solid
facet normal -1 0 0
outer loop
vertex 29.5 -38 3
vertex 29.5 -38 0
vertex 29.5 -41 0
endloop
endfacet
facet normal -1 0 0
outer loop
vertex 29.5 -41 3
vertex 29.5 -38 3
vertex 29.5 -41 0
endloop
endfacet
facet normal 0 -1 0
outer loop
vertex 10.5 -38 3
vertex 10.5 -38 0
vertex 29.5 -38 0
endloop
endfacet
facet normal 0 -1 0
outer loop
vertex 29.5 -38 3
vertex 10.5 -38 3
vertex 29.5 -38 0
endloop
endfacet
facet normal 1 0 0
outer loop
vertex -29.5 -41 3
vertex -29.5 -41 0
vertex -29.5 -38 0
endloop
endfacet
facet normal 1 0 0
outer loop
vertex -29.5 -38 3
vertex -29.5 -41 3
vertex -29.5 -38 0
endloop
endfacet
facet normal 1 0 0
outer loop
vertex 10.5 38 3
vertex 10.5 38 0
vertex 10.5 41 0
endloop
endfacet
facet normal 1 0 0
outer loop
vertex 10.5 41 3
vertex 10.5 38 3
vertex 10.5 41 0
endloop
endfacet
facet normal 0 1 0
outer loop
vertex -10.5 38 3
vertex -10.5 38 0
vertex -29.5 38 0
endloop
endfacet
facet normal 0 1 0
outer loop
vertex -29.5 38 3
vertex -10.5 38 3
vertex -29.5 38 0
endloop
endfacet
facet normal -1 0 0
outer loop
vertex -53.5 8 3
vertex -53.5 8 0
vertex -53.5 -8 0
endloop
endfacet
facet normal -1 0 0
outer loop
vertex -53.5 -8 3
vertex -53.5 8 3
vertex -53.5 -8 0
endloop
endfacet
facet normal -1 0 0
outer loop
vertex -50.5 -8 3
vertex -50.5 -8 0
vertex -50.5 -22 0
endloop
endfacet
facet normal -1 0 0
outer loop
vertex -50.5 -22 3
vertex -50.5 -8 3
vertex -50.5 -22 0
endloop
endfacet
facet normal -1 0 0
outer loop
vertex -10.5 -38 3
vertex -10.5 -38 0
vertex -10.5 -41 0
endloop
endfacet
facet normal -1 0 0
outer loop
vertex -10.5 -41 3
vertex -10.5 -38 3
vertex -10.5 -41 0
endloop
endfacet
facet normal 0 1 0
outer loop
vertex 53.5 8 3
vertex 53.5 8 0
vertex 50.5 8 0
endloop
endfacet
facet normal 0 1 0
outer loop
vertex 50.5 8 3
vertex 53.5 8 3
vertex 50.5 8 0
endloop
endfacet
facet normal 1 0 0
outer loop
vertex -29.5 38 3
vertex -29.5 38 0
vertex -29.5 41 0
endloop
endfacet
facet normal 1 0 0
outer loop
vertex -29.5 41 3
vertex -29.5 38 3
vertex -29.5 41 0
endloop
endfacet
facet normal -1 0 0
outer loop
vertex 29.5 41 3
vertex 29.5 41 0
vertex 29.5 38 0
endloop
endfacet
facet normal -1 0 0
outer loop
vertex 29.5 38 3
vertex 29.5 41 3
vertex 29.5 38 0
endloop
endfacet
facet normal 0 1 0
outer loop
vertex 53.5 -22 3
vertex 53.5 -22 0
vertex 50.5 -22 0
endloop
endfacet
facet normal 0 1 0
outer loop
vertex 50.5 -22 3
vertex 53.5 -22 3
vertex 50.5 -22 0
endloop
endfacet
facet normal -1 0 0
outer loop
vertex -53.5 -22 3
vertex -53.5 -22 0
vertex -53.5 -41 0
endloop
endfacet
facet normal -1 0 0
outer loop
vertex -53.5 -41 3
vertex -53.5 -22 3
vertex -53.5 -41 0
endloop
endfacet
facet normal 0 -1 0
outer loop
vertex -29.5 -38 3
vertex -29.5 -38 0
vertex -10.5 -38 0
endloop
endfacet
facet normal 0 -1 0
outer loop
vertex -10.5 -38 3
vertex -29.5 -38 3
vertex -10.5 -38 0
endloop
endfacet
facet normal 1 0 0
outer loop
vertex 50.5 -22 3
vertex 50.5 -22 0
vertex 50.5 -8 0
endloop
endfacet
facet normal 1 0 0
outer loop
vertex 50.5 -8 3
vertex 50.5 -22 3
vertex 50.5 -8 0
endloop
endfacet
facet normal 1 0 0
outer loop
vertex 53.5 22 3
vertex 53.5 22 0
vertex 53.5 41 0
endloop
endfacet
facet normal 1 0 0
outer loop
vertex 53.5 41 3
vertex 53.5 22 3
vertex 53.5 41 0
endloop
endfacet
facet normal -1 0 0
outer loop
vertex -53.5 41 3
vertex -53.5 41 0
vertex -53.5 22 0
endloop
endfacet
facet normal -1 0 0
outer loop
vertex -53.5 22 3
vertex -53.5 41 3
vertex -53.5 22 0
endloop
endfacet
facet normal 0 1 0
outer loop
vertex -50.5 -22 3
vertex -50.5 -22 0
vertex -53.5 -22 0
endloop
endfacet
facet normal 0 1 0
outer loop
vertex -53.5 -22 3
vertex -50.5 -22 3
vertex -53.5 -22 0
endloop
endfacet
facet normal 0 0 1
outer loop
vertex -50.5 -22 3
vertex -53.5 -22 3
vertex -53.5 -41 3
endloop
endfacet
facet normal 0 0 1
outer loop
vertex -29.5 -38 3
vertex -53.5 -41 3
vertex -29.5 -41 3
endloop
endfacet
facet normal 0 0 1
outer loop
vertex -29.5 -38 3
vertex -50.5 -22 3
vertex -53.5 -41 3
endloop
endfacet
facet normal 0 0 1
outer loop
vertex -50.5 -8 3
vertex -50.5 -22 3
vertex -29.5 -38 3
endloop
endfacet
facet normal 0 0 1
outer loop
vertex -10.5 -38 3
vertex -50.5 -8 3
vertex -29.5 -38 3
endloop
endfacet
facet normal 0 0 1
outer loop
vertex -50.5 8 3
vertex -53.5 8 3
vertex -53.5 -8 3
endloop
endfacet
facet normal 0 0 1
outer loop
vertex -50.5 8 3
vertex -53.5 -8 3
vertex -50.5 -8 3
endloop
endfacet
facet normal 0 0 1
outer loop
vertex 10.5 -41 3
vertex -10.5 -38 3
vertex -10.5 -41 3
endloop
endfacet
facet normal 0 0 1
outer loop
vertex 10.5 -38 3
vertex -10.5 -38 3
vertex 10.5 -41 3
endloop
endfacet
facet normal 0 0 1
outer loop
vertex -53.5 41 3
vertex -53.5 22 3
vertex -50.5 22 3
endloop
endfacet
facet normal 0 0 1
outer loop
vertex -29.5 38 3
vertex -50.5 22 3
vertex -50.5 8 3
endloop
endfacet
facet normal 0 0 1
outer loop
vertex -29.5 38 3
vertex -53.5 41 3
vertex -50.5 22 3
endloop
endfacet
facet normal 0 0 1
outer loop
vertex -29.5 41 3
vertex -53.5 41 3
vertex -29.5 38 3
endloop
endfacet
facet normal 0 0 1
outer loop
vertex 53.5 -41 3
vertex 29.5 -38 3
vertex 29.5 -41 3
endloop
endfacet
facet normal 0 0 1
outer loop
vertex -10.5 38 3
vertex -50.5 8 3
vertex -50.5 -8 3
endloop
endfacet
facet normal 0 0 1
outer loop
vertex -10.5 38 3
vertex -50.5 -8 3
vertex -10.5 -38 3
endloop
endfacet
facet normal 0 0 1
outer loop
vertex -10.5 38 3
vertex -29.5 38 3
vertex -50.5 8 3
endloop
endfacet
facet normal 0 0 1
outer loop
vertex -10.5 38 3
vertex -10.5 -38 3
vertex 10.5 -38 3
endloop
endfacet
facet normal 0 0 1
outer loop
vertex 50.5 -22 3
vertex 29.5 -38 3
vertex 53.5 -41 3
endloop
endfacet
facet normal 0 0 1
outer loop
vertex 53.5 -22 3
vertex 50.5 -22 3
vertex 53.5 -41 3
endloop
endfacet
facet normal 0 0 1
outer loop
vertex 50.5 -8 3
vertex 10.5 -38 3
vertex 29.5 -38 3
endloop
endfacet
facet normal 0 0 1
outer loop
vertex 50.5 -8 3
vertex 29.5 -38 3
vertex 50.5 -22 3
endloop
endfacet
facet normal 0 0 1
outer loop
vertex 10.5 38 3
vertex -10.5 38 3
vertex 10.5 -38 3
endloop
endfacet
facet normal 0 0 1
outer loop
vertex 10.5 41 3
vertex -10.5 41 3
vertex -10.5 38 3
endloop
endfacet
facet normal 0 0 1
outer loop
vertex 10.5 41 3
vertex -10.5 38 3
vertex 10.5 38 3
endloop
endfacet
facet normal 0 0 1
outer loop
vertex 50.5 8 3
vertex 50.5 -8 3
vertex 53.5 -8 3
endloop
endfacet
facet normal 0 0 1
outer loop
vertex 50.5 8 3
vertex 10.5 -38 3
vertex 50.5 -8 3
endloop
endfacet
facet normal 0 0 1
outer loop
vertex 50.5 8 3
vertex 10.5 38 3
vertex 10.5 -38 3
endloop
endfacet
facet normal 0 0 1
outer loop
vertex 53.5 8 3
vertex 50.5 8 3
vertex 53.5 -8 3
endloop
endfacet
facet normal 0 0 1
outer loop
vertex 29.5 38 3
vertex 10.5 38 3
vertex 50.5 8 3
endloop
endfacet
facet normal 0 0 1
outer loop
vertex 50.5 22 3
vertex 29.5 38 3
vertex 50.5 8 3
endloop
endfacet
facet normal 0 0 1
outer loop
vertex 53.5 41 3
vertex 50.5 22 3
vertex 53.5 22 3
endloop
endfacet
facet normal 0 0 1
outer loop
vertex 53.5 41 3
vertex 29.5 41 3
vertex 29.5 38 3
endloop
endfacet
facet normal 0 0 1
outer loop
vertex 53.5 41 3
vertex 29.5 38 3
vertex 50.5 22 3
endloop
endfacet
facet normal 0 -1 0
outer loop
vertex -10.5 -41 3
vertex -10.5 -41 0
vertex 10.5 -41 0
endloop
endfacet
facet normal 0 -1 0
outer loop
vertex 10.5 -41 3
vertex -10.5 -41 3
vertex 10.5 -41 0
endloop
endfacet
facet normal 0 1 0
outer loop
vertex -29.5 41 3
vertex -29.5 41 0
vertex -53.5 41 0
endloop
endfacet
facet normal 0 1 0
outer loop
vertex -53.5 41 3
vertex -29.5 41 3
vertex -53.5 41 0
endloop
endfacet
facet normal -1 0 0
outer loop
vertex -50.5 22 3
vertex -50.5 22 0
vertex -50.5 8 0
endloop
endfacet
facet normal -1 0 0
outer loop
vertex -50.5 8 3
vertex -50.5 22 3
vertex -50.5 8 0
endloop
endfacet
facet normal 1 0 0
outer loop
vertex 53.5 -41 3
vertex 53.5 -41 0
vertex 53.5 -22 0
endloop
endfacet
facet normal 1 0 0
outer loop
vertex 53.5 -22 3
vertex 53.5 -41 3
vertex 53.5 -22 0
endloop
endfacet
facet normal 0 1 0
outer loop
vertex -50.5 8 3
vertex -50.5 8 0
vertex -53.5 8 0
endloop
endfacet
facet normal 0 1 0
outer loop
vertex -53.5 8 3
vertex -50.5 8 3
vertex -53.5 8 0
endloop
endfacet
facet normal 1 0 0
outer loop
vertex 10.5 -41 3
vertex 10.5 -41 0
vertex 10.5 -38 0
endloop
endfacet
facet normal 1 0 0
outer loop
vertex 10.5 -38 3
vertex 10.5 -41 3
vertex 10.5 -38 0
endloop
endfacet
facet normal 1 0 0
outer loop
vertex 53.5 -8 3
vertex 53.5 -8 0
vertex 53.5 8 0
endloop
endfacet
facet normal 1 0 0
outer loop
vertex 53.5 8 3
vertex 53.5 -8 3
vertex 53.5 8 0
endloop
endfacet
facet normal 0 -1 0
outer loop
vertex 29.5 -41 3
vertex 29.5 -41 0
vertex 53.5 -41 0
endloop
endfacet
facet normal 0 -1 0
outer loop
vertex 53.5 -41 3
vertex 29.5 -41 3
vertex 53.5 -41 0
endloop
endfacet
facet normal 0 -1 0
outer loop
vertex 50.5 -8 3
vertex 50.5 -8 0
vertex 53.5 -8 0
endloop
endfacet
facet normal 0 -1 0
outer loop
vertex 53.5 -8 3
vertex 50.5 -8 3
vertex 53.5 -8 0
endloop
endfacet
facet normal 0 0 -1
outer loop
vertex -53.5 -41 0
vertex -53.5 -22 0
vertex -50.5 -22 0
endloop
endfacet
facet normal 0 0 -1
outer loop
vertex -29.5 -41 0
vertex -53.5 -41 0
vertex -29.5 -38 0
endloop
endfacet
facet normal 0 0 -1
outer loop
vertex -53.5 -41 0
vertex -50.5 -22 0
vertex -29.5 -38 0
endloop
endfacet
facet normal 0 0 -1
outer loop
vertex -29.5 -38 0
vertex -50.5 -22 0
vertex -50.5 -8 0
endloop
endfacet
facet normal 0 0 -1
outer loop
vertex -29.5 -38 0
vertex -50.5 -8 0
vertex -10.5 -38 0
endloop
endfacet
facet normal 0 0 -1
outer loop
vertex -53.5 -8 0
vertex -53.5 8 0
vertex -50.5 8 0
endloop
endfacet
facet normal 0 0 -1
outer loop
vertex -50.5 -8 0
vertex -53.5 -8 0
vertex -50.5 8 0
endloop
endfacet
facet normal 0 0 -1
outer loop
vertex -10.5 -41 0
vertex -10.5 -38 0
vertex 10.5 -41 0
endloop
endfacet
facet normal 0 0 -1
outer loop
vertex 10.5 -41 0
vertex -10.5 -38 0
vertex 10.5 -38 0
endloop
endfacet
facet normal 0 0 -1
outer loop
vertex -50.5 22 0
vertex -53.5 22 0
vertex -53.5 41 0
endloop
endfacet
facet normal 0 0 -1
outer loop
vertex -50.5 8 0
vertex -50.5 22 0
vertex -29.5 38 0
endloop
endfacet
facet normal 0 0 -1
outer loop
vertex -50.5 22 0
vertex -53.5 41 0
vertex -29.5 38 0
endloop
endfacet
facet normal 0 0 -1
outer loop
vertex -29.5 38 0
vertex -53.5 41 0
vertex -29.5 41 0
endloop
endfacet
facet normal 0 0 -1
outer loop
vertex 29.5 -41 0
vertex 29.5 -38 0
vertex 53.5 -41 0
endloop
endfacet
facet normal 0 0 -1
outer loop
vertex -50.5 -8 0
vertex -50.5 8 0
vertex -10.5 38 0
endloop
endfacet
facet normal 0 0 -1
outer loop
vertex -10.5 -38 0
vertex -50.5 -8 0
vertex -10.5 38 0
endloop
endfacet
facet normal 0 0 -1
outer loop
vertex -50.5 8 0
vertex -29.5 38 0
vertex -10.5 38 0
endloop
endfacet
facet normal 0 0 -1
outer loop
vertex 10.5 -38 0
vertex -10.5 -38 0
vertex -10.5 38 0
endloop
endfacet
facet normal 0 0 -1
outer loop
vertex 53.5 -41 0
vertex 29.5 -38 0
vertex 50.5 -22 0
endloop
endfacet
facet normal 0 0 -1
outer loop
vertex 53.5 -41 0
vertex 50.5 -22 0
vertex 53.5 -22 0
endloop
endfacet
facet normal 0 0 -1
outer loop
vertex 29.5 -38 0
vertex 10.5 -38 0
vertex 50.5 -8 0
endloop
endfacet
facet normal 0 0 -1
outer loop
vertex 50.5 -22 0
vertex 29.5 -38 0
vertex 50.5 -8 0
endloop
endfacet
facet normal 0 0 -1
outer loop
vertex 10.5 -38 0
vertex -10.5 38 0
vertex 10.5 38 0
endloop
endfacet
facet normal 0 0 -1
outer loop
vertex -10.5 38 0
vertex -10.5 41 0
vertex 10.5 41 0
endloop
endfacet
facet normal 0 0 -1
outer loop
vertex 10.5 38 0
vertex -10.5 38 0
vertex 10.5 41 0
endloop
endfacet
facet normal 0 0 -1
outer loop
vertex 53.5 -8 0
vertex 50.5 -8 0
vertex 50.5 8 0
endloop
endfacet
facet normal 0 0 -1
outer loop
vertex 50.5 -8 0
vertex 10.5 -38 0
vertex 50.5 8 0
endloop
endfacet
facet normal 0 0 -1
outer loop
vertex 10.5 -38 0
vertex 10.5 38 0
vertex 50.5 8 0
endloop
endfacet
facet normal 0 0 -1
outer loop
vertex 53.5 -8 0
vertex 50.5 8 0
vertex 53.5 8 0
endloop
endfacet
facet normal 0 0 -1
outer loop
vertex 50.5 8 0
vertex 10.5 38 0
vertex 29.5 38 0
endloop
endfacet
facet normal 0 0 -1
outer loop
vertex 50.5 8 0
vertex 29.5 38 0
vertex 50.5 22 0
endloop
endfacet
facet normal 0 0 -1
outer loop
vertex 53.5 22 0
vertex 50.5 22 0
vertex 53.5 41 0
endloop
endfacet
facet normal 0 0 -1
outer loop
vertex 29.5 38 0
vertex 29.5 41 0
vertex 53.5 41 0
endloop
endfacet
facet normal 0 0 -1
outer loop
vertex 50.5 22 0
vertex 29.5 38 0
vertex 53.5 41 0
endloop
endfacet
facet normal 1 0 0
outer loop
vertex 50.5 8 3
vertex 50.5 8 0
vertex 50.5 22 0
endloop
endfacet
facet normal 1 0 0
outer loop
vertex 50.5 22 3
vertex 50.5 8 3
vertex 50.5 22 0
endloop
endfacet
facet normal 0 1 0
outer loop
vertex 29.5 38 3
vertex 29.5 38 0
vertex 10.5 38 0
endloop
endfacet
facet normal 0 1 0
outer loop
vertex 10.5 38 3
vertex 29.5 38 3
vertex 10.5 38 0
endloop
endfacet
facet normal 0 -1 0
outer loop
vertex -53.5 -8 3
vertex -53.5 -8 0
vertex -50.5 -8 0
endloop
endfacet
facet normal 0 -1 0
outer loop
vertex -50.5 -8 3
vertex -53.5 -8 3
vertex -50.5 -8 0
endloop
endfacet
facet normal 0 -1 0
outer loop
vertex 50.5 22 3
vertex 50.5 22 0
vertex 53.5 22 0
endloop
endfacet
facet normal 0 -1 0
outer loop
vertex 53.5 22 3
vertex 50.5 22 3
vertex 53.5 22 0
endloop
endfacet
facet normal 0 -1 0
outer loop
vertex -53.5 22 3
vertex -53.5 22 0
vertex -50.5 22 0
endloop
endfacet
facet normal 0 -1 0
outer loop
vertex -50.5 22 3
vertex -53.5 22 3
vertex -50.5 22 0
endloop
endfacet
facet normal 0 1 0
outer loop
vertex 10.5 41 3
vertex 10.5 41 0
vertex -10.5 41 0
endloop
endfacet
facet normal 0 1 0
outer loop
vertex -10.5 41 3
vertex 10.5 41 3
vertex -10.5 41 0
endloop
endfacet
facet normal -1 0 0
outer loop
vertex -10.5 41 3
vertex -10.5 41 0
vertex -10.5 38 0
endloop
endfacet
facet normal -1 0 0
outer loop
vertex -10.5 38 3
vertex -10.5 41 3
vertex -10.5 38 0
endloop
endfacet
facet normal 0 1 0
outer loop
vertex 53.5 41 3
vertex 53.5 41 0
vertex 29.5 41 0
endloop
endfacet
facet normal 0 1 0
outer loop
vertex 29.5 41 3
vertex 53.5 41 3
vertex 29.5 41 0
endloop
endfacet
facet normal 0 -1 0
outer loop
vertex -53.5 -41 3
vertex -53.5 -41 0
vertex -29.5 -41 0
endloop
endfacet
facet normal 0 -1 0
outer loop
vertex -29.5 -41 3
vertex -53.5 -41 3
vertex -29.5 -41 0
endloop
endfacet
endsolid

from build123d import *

# Parameters (mm, degrees)
F2_DEPTH = 3


with BuildPart() as f2:
    # F1 (on Top) → F2 (new body)
    with BuildSketch(Plane.XY):
        Polygon((10.5, -41), (10.5, -38), (29.5, -38), (29.5, -41), (53.5, -41), (53.5, -22), (50.5, -22), (50.5, -8), (53.5, -8), (53.5, 0), (53.5, 8), (50.5, 8), (50.5, 22), (53.5, 22), (53.5, 41), (29.5, 41), (29.5, 38), (10.5, 38), (10.5, 41), (0, 41), (-10.5, 41), (-10.5, 38), (-29.5, 38), (-29.5, 41), (-53.5, 41), (-53.5, 22), (-50.5, 22), (-50.5, 8), (-53.5, 8), (-53.5, 0), (-53.5, -8), (-50.5, -8), (-50.5, -22), (-53.5, -22), (-53.5, -41), (-29.5, -41), (-29.5, -38), (-10.5, -38), (-10.5, -41), (0, -41), align=None)
    extrude(amount=F2_DEPTH)


solid = f2.part
